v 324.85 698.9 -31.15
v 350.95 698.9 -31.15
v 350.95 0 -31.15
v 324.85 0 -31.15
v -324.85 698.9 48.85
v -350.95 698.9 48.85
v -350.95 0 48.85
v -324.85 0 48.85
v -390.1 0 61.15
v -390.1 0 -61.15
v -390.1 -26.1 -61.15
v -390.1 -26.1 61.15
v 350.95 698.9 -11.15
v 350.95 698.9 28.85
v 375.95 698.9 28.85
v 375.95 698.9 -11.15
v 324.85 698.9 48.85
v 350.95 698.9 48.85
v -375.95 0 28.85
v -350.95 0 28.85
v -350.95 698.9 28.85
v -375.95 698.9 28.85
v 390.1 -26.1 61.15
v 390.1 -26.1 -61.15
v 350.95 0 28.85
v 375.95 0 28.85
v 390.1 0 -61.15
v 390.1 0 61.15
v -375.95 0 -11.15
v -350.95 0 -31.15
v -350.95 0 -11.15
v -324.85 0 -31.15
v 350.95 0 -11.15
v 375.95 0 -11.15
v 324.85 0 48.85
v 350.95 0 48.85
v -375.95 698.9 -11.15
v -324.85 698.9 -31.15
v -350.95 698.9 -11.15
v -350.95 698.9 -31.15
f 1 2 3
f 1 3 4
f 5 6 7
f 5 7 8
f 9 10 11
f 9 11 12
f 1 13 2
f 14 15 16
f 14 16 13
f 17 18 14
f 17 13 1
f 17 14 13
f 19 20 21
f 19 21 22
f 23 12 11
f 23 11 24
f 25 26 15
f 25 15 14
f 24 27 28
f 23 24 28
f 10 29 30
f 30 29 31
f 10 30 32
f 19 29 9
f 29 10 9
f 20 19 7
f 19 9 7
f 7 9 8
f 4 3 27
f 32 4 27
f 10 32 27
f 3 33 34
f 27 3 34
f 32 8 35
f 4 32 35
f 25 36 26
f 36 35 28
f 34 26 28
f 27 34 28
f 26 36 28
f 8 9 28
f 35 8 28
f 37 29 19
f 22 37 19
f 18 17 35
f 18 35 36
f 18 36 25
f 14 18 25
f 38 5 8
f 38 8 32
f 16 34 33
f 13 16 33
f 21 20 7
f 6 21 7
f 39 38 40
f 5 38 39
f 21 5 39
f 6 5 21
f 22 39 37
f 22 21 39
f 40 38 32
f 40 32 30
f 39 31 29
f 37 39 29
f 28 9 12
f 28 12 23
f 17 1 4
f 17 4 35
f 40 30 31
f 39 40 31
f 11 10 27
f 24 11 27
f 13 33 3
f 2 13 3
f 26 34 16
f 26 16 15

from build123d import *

# Parameters (mm, degrees)
F0_W     = 780.2
F0_H     = 122.3
F1_DEPTH = 26.1
F2_W     = 25
F2_H     = 40
F3_DEPTH = 698.9


with BuildPart() as f1:
    # F0 (on Front) → F1 (new body)
    with BuildSketch(Plane.XZ):
        Rectangle(F0_W, F0_H)
    extrude(amount=F1_DEPTH)

    # F2 (on face) → F3 (join)
    with BuildSketch(Plane(origin=(0, 0, 0), x_dir=(-1, 0, 0), z_dir=(0, 1, 0))):
        Polygon((-350.95, 48.85), (-350.95, 28.85), (-350.95, -11.15), (-350.95, -31.15), (-324.85, -31.15), (-324.85, 48.85), align=None)
        Polygon((350.95, 28.85), (350.95, 48.85), (324.85, 48.85), (324.85, -31.15), (350.95, -31.15), (350.95, -11.15), align=None)
        with Locations((363.45, 8.85)):
            Rectangle(F2_W, F2_H)
        with Locations((-363.45, 8.85)):
            Rectangle(F2_W, F2_H)
    extrude(amount=F3_DEPTH)


solid = f1.part
